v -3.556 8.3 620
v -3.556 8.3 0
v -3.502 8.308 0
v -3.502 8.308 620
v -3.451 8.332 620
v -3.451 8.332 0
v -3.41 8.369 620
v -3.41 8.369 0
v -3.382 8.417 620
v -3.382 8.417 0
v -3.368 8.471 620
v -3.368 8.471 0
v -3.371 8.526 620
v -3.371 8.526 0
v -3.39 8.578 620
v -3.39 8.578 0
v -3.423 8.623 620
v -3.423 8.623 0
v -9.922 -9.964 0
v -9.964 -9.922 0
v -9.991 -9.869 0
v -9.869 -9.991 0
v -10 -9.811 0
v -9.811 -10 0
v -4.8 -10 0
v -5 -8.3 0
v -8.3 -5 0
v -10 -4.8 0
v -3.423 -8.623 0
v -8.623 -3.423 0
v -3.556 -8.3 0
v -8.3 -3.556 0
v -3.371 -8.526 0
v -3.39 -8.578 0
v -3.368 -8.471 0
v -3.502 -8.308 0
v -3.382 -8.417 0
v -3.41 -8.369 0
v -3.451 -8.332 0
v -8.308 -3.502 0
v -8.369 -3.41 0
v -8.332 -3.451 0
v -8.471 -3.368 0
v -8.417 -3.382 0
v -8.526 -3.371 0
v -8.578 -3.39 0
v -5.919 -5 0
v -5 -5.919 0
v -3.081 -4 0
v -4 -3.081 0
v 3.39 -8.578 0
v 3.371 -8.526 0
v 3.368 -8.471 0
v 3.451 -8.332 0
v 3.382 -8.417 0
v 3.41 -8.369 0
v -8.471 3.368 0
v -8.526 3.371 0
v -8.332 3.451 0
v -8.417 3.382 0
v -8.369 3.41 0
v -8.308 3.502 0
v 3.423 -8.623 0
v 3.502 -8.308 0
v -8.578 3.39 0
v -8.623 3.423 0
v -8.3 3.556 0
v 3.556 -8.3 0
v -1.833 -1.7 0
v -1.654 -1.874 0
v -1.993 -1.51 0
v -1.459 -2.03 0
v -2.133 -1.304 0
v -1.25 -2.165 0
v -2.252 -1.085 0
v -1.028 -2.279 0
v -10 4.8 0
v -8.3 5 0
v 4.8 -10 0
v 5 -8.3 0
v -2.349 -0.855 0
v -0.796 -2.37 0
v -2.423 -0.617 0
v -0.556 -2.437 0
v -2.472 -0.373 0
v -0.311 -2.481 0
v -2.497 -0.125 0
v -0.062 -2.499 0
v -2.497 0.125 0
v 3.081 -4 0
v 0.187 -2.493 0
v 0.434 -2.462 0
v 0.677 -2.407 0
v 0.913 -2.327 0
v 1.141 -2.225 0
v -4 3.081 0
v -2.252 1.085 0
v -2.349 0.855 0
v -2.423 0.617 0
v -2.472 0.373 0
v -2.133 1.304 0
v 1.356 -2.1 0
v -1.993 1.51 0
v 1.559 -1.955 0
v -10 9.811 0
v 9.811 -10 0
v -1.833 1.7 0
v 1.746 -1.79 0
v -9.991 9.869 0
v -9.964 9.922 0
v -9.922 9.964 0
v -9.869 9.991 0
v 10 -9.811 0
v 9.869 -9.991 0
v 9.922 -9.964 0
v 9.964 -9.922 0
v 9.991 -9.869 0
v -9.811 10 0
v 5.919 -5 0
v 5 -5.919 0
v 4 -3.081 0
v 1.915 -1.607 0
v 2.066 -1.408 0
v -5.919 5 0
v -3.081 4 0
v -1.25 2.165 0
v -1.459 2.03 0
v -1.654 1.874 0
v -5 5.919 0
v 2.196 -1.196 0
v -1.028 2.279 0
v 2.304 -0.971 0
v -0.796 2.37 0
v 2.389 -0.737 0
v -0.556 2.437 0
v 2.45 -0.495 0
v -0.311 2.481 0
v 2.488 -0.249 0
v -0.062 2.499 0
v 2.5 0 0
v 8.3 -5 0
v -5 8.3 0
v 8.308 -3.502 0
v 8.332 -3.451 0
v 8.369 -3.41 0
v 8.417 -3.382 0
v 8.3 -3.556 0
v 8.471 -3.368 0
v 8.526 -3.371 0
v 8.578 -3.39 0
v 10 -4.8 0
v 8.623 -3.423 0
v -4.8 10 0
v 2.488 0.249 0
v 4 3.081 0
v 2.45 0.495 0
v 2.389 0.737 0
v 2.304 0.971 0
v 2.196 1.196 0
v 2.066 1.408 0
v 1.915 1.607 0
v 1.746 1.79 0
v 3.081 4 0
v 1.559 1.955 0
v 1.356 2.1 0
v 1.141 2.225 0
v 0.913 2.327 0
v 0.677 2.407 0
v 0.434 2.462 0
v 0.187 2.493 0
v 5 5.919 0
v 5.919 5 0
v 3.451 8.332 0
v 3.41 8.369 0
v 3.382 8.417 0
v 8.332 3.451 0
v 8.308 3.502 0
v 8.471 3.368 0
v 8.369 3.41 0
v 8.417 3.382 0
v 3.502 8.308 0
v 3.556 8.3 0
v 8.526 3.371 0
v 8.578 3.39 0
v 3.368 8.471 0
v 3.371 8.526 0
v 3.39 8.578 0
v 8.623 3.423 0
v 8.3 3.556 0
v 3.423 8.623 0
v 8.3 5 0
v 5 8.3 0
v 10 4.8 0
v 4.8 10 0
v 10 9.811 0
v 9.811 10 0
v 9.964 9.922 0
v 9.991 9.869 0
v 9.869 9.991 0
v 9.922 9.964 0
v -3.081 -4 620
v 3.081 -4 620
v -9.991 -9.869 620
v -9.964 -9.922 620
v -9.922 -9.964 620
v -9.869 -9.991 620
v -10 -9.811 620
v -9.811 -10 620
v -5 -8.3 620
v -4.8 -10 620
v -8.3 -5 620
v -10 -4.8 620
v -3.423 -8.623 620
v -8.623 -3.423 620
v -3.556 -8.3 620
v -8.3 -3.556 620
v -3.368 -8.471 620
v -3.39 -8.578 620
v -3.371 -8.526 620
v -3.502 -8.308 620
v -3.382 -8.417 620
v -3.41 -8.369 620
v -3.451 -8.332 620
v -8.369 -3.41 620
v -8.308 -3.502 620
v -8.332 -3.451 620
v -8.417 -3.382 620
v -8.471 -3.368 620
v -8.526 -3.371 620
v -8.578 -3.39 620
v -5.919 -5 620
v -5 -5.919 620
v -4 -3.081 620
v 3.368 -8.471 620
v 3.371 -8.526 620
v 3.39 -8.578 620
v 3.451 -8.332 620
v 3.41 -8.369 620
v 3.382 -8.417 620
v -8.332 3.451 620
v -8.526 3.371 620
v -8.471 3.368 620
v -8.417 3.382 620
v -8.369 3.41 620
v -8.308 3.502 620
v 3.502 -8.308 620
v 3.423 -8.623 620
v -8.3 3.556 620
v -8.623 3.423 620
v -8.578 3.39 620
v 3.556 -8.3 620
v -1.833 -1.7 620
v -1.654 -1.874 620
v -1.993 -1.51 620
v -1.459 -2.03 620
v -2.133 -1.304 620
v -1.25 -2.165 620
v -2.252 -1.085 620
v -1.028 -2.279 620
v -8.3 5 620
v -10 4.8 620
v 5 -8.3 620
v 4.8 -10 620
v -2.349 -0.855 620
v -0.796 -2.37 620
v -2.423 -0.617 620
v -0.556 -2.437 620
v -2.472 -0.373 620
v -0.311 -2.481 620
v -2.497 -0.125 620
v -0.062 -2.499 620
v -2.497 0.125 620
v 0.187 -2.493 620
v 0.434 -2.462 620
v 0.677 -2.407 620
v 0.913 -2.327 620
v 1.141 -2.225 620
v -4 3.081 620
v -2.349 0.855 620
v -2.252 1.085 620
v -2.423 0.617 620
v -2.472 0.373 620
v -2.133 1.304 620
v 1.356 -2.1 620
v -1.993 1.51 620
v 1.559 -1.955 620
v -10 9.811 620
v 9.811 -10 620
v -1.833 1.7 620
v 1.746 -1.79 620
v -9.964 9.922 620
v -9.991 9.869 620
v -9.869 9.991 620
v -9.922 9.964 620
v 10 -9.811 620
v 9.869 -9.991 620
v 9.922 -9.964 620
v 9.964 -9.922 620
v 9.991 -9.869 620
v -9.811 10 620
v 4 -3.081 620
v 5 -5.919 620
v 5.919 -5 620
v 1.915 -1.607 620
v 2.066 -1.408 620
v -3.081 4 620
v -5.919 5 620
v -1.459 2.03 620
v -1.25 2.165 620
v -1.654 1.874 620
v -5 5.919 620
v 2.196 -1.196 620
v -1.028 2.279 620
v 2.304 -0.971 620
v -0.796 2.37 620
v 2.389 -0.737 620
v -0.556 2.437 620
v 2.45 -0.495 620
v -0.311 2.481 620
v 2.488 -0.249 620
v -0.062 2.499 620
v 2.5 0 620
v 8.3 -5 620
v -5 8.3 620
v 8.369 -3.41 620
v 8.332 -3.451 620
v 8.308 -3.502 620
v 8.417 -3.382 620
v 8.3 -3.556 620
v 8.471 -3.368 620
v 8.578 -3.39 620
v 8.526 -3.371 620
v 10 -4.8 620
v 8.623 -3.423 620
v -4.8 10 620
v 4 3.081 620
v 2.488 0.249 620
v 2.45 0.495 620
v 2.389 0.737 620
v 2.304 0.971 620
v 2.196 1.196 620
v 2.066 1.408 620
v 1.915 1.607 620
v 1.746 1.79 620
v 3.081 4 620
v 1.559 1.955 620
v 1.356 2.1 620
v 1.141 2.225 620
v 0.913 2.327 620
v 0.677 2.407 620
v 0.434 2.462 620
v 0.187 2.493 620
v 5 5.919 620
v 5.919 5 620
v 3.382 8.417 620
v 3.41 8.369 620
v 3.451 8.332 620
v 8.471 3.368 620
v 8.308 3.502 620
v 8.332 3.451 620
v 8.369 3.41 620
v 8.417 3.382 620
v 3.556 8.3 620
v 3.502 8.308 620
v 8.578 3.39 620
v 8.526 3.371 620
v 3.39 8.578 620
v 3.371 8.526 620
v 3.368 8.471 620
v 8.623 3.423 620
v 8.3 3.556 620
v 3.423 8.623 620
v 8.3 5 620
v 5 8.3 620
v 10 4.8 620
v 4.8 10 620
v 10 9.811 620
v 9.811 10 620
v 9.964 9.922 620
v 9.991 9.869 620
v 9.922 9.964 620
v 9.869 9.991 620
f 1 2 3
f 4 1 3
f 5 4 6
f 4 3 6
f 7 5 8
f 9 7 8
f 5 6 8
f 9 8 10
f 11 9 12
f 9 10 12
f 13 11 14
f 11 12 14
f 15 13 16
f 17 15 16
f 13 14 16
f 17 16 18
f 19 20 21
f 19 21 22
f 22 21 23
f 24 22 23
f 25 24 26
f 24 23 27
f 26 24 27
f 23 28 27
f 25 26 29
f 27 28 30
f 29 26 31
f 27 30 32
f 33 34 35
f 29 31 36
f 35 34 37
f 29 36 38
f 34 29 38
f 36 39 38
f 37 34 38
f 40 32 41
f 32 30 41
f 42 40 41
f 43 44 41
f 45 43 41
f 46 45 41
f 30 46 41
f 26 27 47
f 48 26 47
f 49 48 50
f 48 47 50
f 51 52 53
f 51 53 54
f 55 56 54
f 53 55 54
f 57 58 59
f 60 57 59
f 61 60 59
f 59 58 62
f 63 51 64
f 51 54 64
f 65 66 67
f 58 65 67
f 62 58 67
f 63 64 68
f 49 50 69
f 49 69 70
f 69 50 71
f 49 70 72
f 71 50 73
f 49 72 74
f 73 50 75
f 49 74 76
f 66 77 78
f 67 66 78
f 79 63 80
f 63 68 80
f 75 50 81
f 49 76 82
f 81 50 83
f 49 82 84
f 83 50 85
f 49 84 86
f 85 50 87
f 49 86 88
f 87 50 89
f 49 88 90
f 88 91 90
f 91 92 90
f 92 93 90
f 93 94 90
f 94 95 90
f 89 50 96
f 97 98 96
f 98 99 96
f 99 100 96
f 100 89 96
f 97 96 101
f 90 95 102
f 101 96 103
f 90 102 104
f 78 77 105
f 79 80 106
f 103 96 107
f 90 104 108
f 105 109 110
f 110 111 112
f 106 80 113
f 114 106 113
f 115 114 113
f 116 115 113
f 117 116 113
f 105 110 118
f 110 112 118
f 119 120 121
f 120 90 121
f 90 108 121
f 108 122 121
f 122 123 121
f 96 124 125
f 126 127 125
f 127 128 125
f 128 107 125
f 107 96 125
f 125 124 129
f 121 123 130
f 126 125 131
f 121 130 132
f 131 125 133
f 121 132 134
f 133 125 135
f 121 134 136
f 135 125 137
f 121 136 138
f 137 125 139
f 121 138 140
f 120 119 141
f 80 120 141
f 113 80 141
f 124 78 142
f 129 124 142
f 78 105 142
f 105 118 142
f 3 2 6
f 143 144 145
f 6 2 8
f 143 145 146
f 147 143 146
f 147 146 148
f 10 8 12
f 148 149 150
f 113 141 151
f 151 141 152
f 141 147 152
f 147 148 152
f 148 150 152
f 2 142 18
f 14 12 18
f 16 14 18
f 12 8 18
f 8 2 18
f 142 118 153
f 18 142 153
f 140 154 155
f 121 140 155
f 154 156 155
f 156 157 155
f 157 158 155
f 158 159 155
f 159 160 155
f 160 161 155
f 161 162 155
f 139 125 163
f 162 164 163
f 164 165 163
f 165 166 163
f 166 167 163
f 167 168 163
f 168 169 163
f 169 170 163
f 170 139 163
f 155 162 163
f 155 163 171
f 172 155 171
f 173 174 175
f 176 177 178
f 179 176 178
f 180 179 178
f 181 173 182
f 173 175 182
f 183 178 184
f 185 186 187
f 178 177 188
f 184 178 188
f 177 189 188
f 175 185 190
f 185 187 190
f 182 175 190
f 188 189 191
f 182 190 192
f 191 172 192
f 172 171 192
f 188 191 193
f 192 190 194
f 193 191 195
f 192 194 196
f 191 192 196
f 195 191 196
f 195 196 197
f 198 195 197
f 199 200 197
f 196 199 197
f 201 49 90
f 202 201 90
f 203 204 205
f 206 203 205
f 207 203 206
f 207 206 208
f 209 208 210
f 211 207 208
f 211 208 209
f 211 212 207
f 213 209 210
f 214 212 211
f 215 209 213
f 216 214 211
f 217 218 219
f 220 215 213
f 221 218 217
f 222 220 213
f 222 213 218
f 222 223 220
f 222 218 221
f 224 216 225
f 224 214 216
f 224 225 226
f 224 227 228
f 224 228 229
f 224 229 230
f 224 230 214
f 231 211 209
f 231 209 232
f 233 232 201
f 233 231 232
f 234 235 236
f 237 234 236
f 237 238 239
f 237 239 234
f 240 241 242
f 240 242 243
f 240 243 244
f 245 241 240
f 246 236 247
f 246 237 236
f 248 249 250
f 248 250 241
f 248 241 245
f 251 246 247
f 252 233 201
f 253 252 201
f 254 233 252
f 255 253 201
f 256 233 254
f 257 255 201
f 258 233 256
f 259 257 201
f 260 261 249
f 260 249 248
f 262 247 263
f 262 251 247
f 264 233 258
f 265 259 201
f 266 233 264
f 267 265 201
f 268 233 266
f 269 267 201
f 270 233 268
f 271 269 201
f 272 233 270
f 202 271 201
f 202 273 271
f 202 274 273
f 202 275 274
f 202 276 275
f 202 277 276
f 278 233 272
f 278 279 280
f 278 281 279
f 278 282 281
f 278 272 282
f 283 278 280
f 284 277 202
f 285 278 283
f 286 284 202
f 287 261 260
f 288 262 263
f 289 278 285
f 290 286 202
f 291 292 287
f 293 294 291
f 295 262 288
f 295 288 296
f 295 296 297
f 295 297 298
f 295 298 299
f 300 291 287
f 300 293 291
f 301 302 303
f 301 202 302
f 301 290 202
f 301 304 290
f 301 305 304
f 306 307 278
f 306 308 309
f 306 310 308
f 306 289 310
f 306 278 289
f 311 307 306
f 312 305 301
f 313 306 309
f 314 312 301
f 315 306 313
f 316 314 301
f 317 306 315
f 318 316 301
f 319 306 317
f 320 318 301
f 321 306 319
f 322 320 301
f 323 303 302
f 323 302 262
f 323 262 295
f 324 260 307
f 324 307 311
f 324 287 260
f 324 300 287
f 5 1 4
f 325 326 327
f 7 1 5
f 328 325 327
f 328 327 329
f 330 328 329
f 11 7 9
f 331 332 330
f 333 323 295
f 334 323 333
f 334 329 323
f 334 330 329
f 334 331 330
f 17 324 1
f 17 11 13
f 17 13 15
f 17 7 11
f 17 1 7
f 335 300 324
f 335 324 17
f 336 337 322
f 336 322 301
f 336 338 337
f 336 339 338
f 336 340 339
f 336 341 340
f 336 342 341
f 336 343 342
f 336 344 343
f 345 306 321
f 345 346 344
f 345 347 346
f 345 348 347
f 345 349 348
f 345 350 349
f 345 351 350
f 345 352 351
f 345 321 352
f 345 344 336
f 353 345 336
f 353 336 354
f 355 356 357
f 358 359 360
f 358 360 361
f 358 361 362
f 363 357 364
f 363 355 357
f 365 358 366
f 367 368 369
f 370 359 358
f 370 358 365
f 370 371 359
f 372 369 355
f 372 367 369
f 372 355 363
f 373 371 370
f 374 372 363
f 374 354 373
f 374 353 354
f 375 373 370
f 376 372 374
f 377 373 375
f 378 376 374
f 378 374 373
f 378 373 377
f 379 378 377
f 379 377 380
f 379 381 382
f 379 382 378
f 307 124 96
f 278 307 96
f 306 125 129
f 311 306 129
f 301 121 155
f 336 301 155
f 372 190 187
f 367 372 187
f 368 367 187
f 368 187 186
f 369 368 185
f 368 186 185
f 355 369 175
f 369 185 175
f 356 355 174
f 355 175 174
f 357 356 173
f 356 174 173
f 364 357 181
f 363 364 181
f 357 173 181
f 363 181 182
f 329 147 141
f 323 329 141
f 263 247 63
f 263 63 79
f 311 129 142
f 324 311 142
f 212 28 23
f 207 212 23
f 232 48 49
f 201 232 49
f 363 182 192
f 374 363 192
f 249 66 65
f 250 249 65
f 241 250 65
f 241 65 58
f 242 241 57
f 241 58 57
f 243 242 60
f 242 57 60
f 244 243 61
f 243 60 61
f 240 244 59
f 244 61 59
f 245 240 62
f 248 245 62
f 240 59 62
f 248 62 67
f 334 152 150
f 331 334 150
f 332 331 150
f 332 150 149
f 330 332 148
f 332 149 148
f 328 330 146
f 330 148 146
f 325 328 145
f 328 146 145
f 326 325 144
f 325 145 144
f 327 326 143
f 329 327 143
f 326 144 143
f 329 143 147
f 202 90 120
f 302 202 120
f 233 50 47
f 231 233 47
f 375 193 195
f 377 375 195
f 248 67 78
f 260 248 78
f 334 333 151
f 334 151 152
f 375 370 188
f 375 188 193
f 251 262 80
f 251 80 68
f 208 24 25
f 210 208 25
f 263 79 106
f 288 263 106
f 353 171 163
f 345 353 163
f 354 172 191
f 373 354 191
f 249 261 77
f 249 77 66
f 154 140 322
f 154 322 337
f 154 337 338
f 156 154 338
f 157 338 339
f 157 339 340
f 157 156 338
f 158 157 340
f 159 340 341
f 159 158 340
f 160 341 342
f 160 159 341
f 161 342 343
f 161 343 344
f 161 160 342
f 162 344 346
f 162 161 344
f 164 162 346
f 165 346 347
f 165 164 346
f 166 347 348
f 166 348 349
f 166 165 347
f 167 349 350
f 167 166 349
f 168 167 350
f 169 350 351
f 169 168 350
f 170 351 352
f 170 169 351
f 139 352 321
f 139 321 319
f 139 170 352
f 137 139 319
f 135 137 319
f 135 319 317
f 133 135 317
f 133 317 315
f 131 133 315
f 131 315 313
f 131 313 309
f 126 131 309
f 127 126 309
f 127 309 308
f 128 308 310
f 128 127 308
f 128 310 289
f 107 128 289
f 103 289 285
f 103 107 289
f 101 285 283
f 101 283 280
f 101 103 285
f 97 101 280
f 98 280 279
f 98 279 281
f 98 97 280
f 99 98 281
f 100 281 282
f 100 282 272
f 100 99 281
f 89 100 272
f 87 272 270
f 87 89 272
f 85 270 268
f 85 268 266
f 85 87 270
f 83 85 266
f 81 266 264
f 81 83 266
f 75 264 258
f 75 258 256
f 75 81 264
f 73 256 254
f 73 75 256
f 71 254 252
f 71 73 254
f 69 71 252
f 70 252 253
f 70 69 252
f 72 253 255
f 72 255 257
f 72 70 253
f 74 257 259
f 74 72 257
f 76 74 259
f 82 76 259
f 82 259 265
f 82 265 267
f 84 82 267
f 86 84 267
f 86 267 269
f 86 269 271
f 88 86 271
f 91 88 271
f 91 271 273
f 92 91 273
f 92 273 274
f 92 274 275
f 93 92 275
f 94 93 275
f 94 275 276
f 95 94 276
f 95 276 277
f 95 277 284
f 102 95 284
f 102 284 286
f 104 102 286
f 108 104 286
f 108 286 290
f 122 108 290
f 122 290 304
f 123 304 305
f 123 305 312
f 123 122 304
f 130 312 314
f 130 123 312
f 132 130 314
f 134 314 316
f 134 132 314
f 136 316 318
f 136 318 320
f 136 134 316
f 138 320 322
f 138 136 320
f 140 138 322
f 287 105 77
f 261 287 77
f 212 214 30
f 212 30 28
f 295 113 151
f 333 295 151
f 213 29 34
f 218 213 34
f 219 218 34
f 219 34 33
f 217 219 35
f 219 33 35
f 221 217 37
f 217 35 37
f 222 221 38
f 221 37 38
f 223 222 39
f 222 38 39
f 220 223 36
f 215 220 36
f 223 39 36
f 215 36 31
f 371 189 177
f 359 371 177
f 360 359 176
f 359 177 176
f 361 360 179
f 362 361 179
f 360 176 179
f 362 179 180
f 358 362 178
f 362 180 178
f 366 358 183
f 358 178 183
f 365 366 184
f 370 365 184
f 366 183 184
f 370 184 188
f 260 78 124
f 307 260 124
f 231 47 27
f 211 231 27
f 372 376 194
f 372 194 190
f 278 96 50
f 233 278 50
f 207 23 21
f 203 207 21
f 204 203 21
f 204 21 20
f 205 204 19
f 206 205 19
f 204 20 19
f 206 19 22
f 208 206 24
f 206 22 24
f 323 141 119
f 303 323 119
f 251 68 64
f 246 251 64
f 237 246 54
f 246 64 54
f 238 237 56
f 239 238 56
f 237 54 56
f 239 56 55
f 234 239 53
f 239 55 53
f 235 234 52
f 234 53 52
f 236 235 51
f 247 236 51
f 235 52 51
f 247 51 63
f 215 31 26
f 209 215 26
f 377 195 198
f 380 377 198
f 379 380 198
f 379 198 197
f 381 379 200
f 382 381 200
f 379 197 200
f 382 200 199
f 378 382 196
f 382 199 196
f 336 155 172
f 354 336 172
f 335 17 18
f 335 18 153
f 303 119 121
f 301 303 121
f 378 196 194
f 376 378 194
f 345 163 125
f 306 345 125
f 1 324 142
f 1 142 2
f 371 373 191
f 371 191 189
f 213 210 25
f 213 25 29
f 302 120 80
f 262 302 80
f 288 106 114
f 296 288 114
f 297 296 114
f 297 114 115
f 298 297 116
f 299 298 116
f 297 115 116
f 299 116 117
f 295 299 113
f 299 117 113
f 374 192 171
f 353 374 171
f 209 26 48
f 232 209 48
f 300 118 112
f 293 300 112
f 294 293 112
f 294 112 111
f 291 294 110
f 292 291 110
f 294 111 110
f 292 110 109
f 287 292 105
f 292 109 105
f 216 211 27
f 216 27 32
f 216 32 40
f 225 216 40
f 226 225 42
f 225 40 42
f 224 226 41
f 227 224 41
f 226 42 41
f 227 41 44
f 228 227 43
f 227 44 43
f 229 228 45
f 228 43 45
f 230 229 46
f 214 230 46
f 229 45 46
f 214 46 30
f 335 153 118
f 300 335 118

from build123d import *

# Parameters (mm, degrees)
SKETCH1_R           = 2.5
BOSS_EXTRUDE5_DEPTH = 620


with BuildPart() as part:
    # Sketch1 → Boss-Extrude5 (new body)
    with BuildSketch(Plane.XY):
        with BuildLine():
            Line((-10, 9.810918806), (-10, 4.8))
            Line((-10, 4.8), (-8.622781789, 3.422781789))
            ThreePointArc((-8.622781789, 3.422781789), (-8.416722954, 3.381794139), (-8.3, 3.556482384))
            Line((-8.3, 3.556482384), (-8.3, 5))
            Line((-8.3, 5), (-5.919238816, 5))
            Line((-5.919238816, 5), (-4, 3.080761184))
            Line((-4, 3.080761184), (-4, -3.080761184))
            Line((-4, -3.080761184), (-5.919238816, -5))
            Line((-5.919238816, -5), (-8.3, -5))
            Line((-8.3, -5), (-8.3, -3.556482384))
            ThreePointArc((-8.3, -3.556482384), (-8.416722954, -3.381794139), (-8.622781789, -3.422781789))
            Line((-8.622781789, -3.422781789), (-10, -4.8))
            Line((-10, -4.8), (-10, -9.810918806))
            ThreePointArc((-10, -9.810918806), (-9.9446194, -9.9446194), (-9.810918806, -10))
            Line((-9.810918806, -10), (-4.8, -10))
            Line((-4.8, -10), (-3.422781789, -8.622781789))
            ThreePointArc((-3.422781789, -8.622781789), (-3.381794139, -8.416722954), (-3.556482384, -8.3))
            Line((-3.556482384, -8.3), (-5, -8.3))
            Line((-5, -8.3), (-5, -5.919238816))
            Line((-5, -5.919238816), (-3.080761184, -4))
            Line((-3.080761184, -4), (0, -4))
            Line((0, -4), (3.080761184, -4))
            Line((3.080761184, -4), (5, -5.919238816))
            Line((5, -5.919238816), (5, -8.3))
            Line((5, -8.3), (3.556482384, -8.3))
            ThreePointArc((3.556482384, -8.3), (3.381794139, -8.416722954), (3.422781789, -8.622781789))
            Line((3.422781789, -8.622781789), (4.8, -10))
            Line((4.8, -10), (9.810918806, -10))
            ThreePointArc((9.810918806, -10), (9.9446194, -9.9446194), (10, -9.810918806))
            Line((10, -9.810918806), (10, -4.8))
            Line((10, -4.8), (8.622781789, -3.422781789))
            ThreePointArc((8.622781789, -3.422781789), (8.416722954, -3.381794139), (8.3, -3.556482384))
            Line((8.3, -3.556482384), (8.3, -5))
            Line((8.3, -5), (5.919238816, -5))
            Line((5.919238816, -5), (4, -3.080761184))
            Line((4, -3.080761184), (4, 3.080761184))
            Line((4, 3.080761184), (5.919238816, 5))
            Line((5.919238816, 5), (8.3, 5))
            Line((8.3, 5), (8.3, 3.556482384))
            ThreePointArc((8.3, 3.556482384), (8.416722954, 3.381794139), (8.622781789, 3.422781789))
            Line((8.622781789, 3.422781789), (10, 4.8))
            Line((10, 4.8), (10, 9.810918806))
            ThreePointArc((10, 9.810918806), (9.9446194, 9.9446194), (9.810918806, 10))
            Line((9.810918806, 10), (4.8, 10))
            Line((4.8, 10), (3.422781789, 8.622781789))
            ThreePointArc((3.422781789, 8.622781789), (3.381794139, 8.416722954), (3.556482384, 8.3))
            Line((3.556482384, 8.3), (5, 8.3))
            Line((5, 8.3), (5, 5.919238816))
            Line((5, 5.919238816), (3.080761184, 4))
            Line((3.080761184, 4), (-3.080761184, 4))
            Line((-3.080761184, 4), (-5, 5.919238816))
            Line((-5, 5.919238816), (-5, 8.3))
            Line((-5, 8.3), (-3.556482384, 8.3))
            ThreePointArc((-3.556482384, 8.3), (-3.381794139, 8.416722954), (-3.422781789, 8.622781789))
            Line((-3.422781789, 8.622781789), (-4.8, 10))
            Line((-4.8, 10), (-9.810918806, 10))
            ThreePointArc((-9.810918806, 10), (-9.9446194, 9.9446194), (-10, 9.810918806))
        make_face()
        Circle(SKETCH1_R, mode=Mode.SUBTRACT)
    extrude(amount=BOSS_EXTRUDE5_DEPTH)


solid = part.part
